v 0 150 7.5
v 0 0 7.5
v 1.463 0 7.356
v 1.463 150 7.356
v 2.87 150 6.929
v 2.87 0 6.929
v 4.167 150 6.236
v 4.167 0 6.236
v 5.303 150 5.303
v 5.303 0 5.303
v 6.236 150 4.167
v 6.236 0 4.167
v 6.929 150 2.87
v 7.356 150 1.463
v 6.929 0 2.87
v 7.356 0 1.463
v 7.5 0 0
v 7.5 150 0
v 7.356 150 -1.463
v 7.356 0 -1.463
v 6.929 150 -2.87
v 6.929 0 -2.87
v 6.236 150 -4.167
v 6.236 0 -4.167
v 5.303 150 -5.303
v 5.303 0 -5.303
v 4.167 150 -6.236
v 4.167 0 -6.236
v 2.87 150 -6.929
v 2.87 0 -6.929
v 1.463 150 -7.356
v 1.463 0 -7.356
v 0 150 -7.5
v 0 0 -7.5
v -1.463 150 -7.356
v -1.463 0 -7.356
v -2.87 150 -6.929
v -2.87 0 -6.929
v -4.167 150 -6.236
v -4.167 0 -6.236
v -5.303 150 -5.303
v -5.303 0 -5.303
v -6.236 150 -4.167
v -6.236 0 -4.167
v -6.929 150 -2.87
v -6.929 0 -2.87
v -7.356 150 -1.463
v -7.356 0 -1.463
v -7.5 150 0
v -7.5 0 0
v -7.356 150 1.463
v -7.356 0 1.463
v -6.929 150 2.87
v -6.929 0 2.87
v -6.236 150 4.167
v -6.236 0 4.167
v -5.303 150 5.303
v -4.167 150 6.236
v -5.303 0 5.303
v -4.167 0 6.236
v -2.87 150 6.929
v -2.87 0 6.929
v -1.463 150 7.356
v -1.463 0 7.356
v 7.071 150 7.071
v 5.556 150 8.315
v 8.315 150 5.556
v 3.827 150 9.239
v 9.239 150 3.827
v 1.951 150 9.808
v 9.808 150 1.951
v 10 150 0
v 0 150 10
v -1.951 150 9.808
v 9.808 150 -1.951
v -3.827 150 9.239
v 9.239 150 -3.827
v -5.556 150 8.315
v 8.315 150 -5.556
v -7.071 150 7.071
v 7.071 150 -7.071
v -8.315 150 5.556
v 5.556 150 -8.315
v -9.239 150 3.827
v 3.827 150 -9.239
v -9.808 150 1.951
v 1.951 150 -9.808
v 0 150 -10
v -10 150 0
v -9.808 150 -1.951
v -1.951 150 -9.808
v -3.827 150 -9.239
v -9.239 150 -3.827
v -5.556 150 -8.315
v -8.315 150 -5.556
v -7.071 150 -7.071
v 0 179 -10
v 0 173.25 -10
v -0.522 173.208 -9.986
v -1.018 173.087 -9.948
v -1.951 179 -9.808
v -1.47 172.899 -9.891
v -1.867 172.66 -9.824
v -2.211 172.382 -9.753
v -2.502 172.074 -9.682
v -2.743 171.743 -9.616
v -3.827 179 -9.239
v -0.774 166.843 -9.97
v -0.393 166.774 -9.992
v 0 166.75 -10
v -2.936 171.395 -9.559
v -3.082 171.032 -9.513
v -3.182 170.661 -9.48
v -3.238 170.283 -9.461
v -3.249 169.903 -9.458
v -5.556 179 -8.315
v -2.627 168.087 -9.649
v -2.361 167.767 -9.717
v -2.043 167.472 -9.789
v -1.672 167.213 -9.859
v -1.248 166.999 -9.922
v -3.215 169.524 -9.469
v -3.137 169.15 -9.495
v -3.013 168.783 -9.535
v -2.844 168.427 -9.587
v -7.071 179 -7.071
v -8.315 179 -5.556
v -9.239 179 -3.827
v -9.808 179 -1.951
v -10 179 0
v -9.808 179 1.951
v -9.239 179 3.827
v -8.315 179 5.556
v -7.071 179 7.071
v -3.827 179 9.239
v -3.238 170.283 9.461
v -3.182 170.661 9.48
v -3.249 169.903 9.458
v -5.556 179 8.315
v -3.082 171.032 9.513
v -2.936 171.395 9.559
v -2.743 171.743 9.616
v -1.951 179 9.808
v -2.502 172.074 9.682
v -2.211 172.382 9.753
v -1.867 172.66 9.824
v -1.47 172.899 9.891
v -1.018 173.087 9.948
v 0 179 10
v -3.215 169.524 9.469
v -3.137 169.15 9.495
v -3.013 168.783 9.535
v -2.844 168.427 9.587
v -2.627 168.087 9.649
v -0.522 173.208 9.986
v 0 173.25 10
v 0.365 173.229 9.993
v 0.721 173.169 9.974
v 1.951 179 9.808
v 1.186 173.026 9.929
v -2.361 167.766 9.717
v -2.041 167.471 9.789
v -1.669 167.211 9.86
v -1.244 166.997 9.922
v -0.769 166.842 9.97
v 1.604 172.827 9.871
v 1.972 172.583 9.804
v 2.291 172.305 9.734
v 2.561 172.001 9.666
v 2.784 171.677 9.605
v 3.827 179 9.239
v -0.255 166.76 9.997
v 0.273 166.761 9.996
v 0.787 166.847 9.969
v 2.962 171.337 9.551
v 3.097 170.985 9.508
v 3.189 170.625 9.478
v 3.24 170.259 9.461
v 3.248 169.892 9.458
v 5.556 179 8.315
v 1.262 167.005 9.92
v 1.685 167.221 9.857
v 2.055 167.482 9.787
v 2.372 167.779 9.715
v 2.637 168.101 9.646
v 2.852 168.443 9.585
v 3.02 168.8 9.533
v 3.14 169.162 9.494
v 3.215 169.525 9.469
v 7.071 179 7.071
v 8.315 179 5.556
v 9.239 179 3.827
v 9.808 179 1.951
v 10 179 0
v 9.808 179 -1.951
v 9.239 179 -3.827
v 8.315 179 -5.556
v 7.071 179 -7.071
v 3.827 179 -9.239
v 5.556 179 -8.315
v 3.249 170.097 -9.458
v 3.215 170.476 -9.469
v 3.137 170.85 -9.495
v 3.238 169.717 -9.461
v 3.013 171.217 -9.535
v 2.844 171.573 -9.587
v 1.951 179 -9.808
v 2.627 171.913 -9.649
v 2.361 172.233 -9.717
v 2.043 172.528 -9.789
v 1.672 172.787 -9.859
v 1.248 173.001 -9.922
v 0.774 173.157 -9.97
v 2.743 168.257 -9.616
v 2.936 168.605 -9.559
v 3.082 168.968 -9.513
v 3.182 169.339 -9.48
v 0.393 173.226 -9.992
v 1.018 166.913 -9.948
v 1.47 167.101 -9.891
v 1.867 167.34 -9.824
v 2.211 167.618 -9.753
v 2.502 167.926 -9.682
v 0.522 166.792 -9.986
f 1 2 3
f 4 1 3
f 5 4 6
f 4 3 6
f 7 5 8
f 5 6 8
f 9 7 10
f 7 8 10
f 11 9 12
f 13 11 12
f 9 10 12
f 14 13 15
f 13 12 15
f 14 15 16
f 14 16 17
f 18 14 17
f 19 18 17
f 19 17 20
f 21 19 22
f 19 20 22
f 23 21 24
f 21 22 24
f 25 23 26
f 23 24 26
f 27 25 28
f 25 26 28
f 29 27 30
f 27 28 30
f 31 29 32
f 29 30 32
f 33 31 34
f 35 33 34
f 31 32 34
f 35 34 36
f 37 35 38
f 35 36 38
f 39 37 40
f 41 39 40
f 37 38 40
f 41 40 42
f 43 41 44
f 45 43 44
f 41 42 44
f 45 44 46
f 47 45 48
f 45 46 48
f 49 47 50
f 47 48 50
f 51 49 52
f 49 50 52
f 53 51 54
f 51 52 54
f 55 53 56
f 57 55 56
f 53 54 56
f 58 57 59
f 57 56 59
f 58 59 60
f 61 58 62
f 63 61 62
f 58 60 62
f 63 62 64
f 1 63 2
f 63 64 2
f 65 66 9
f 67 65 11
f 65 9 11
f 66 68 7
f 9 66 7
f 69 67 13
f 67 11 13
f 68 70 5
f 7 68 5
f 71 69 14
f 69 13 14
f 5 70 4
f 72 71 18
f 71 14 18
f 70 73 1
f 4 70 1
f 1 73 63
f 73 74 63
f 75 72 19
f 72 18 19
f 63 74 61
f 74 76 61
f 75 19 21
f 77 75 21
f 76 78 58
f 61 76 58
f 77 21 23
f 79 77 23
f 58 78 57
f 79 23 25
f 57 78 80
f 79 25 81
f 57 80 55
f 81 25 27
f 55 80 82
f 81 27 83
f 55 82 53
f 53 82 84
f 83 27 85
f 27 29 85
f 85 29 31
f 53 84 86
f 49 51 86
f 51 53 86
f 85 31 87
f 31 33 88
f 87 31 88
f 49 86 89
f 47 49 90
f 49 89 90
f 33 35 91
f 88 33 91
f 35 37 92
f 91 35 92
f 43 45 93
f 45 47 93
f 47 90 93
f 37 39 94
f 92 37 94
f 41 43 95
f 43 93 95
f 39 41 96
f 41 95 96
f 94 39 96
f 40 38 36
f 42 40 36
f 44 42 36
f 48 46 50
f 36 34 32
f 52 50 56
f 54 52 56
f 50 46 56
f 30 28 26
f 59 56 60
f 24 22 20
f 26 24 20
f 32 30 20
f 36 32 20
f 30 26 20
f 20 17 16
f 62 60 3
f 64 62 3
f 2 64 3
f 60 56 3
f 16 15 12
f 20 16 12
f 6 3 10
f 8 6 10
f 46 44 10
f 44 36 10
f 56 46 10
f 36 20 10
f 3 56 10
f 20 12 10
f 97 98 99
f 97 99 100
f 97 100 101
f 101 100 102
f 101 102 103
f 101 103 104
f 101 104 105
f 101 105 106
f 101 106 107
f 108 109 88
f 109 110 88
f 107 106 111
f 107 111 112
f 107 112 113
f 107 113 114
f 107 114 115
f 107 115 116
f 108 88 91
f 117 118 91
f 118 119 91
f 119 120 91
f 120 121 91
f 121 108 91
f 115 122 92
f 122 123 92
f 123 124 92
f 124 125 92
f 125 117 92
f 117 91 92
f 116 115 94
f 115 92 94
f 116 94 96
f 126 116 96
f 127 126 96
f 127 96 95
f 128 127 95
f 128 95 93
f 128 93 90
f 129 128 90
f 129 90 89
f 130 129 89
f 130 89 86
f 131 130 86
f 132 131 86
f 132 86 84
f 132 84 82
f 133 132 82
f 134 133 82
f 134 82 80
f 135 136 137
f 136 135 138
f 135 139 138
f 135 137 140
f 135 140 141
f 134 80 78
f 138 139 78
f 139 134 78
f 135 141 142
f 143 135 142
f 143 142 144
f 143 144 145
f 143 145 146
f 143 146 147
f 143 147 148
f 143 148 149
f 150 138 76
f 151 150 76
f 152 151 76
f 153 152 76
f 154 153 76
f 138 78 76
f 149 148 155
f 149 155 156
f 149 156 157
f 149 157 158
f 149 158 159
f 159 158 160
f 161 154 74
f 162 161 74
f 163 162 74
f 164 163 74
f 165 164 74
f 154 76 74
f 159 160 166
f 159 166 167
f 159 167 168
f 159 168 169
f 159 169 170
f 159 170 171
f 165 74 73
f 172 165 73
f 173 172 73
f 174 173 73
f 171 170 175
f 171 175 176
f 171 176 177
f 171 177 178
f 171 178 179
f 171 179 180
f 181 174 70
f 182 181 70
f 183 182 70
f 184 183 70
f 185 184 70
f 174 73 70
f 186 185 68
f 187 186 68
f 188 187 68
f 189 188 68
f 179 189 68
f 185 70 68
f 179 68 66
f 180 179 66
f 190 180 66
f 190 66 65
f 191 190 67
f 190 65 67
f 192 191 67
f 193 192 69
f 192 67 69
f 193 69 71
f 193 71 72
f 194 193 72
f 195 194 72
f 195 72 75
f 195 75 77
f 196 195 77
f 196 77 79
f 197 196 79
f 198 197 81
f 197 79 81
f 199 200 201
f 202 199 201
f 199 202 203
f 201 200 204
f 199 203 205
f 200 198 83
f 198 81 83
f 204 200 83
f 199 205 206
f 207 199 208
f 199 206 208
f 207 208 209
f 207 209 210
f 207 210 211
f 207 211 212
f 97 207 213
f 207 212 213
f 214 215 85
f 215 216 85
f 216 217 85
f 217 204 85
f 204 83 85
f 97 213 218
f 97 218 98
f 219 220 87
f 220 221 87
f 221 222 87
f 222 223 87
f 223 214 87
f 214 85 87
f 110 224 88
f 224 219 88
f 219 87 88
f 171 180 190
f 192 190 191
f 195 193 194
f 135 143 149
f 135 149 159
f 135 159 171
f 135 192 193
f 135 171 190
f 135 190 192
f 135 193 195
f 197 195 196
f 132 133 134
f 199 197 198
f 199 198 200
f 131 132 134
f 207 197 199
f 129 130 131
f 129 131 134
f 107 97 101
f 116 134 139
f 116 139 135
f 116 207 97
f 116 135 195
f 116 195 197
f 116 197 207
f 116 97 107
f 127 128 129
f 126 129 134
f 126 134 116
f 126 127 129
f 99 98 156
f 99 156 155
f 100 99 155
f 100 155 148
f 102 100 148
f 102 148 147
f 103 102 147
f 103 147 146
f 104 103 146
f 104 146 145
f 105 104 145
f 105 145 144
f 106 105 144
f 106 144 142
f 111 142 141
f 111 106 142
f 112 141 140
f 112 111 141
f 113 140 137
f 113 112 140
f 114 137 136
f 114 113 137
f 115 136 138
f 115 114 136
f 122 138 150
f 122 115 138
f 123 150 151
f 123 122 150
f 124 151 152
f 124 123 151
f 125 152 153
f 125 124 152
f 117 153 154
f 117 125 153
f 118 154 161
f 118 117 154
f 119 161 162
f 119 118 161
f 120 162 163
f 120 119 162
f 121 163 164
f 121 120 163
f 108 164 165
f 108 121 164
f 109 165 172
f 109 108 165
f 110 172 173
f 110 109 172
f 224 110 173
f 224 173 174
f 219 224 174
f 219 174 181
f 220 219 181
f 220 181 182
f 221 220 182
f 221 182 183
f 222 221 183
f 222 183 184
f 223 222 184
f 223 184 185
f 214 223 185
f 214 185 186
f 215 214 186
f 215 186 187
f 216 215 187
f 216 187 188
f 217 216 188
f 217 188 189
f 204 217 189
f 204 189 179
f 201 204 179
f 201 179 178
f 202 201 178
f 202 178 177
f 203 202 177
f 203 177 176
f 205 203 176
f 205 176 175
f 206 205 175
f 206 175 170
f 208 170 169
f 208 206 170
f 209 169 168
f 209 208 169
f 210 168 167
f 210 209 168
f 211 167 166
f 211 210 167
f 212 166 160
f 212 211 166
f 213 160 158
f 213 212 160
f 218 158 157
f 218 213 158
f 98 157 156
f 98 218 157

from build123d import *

# Parameters (mm, degrees)
SKETCH_1_R               = 7.5
EXTRUDE_1_DEPTH          = 150
SKETCH_2_R               = 10
EXTRUDE_2_DEPTH          = 29
CUT_EXTRUDE_1_DEPTH      = 180.55779014
CUT_EXTRUDE_1_DEPTH_BACK = 180.55779014
SKETCH_3_R               = 3.25


with BuildPart() as part:
    # 草图1 → 凸台-拉伸1 (new body)
    with BuildSketch(Plane(origin=(0, 0, 0), x_dir=(1, 0, 0), z_dir=(0, 1, 0))):
        with Locations(Location((0, 0, 0), (0, 0, 270))):
            Circle(SKETCH_1_R)
    extrude(amount=EXTRUDE_1_DEPTH)

    # 草图2 → 凸台-拉伸2 (add)
    with BuildSketch(Plane(origin=(0, 150, 0), x_dir=(1, 0, 0), z_dir=(0, 1, 0))):
        with Locations(Location((0, 0, 0), (0, 0, 90))):
            Circle(SKETCH_2_R)
    extrude(amount=EXTRUDE_2_DEPTH)

    # 草图3 → 切除-拉伸1 (cut, two sides: drawn at the far end of the back side and taken through both)
    with BuildSketch(Plane.XY.offset(-CUT_EXTRUDE_1_DEPTH_BACK)):
        with Locations(Location((0, 170, 0), (0, 0, 89.999999989))):
            Circle(SKETCH_3_R)
    extrude(amount=CUT_EXTRUDE_1_DEPTH + CUT_EXTRUDE_1_DEPTH_BACK, mode=Mode.SUBTRACT)


solid = part.part
